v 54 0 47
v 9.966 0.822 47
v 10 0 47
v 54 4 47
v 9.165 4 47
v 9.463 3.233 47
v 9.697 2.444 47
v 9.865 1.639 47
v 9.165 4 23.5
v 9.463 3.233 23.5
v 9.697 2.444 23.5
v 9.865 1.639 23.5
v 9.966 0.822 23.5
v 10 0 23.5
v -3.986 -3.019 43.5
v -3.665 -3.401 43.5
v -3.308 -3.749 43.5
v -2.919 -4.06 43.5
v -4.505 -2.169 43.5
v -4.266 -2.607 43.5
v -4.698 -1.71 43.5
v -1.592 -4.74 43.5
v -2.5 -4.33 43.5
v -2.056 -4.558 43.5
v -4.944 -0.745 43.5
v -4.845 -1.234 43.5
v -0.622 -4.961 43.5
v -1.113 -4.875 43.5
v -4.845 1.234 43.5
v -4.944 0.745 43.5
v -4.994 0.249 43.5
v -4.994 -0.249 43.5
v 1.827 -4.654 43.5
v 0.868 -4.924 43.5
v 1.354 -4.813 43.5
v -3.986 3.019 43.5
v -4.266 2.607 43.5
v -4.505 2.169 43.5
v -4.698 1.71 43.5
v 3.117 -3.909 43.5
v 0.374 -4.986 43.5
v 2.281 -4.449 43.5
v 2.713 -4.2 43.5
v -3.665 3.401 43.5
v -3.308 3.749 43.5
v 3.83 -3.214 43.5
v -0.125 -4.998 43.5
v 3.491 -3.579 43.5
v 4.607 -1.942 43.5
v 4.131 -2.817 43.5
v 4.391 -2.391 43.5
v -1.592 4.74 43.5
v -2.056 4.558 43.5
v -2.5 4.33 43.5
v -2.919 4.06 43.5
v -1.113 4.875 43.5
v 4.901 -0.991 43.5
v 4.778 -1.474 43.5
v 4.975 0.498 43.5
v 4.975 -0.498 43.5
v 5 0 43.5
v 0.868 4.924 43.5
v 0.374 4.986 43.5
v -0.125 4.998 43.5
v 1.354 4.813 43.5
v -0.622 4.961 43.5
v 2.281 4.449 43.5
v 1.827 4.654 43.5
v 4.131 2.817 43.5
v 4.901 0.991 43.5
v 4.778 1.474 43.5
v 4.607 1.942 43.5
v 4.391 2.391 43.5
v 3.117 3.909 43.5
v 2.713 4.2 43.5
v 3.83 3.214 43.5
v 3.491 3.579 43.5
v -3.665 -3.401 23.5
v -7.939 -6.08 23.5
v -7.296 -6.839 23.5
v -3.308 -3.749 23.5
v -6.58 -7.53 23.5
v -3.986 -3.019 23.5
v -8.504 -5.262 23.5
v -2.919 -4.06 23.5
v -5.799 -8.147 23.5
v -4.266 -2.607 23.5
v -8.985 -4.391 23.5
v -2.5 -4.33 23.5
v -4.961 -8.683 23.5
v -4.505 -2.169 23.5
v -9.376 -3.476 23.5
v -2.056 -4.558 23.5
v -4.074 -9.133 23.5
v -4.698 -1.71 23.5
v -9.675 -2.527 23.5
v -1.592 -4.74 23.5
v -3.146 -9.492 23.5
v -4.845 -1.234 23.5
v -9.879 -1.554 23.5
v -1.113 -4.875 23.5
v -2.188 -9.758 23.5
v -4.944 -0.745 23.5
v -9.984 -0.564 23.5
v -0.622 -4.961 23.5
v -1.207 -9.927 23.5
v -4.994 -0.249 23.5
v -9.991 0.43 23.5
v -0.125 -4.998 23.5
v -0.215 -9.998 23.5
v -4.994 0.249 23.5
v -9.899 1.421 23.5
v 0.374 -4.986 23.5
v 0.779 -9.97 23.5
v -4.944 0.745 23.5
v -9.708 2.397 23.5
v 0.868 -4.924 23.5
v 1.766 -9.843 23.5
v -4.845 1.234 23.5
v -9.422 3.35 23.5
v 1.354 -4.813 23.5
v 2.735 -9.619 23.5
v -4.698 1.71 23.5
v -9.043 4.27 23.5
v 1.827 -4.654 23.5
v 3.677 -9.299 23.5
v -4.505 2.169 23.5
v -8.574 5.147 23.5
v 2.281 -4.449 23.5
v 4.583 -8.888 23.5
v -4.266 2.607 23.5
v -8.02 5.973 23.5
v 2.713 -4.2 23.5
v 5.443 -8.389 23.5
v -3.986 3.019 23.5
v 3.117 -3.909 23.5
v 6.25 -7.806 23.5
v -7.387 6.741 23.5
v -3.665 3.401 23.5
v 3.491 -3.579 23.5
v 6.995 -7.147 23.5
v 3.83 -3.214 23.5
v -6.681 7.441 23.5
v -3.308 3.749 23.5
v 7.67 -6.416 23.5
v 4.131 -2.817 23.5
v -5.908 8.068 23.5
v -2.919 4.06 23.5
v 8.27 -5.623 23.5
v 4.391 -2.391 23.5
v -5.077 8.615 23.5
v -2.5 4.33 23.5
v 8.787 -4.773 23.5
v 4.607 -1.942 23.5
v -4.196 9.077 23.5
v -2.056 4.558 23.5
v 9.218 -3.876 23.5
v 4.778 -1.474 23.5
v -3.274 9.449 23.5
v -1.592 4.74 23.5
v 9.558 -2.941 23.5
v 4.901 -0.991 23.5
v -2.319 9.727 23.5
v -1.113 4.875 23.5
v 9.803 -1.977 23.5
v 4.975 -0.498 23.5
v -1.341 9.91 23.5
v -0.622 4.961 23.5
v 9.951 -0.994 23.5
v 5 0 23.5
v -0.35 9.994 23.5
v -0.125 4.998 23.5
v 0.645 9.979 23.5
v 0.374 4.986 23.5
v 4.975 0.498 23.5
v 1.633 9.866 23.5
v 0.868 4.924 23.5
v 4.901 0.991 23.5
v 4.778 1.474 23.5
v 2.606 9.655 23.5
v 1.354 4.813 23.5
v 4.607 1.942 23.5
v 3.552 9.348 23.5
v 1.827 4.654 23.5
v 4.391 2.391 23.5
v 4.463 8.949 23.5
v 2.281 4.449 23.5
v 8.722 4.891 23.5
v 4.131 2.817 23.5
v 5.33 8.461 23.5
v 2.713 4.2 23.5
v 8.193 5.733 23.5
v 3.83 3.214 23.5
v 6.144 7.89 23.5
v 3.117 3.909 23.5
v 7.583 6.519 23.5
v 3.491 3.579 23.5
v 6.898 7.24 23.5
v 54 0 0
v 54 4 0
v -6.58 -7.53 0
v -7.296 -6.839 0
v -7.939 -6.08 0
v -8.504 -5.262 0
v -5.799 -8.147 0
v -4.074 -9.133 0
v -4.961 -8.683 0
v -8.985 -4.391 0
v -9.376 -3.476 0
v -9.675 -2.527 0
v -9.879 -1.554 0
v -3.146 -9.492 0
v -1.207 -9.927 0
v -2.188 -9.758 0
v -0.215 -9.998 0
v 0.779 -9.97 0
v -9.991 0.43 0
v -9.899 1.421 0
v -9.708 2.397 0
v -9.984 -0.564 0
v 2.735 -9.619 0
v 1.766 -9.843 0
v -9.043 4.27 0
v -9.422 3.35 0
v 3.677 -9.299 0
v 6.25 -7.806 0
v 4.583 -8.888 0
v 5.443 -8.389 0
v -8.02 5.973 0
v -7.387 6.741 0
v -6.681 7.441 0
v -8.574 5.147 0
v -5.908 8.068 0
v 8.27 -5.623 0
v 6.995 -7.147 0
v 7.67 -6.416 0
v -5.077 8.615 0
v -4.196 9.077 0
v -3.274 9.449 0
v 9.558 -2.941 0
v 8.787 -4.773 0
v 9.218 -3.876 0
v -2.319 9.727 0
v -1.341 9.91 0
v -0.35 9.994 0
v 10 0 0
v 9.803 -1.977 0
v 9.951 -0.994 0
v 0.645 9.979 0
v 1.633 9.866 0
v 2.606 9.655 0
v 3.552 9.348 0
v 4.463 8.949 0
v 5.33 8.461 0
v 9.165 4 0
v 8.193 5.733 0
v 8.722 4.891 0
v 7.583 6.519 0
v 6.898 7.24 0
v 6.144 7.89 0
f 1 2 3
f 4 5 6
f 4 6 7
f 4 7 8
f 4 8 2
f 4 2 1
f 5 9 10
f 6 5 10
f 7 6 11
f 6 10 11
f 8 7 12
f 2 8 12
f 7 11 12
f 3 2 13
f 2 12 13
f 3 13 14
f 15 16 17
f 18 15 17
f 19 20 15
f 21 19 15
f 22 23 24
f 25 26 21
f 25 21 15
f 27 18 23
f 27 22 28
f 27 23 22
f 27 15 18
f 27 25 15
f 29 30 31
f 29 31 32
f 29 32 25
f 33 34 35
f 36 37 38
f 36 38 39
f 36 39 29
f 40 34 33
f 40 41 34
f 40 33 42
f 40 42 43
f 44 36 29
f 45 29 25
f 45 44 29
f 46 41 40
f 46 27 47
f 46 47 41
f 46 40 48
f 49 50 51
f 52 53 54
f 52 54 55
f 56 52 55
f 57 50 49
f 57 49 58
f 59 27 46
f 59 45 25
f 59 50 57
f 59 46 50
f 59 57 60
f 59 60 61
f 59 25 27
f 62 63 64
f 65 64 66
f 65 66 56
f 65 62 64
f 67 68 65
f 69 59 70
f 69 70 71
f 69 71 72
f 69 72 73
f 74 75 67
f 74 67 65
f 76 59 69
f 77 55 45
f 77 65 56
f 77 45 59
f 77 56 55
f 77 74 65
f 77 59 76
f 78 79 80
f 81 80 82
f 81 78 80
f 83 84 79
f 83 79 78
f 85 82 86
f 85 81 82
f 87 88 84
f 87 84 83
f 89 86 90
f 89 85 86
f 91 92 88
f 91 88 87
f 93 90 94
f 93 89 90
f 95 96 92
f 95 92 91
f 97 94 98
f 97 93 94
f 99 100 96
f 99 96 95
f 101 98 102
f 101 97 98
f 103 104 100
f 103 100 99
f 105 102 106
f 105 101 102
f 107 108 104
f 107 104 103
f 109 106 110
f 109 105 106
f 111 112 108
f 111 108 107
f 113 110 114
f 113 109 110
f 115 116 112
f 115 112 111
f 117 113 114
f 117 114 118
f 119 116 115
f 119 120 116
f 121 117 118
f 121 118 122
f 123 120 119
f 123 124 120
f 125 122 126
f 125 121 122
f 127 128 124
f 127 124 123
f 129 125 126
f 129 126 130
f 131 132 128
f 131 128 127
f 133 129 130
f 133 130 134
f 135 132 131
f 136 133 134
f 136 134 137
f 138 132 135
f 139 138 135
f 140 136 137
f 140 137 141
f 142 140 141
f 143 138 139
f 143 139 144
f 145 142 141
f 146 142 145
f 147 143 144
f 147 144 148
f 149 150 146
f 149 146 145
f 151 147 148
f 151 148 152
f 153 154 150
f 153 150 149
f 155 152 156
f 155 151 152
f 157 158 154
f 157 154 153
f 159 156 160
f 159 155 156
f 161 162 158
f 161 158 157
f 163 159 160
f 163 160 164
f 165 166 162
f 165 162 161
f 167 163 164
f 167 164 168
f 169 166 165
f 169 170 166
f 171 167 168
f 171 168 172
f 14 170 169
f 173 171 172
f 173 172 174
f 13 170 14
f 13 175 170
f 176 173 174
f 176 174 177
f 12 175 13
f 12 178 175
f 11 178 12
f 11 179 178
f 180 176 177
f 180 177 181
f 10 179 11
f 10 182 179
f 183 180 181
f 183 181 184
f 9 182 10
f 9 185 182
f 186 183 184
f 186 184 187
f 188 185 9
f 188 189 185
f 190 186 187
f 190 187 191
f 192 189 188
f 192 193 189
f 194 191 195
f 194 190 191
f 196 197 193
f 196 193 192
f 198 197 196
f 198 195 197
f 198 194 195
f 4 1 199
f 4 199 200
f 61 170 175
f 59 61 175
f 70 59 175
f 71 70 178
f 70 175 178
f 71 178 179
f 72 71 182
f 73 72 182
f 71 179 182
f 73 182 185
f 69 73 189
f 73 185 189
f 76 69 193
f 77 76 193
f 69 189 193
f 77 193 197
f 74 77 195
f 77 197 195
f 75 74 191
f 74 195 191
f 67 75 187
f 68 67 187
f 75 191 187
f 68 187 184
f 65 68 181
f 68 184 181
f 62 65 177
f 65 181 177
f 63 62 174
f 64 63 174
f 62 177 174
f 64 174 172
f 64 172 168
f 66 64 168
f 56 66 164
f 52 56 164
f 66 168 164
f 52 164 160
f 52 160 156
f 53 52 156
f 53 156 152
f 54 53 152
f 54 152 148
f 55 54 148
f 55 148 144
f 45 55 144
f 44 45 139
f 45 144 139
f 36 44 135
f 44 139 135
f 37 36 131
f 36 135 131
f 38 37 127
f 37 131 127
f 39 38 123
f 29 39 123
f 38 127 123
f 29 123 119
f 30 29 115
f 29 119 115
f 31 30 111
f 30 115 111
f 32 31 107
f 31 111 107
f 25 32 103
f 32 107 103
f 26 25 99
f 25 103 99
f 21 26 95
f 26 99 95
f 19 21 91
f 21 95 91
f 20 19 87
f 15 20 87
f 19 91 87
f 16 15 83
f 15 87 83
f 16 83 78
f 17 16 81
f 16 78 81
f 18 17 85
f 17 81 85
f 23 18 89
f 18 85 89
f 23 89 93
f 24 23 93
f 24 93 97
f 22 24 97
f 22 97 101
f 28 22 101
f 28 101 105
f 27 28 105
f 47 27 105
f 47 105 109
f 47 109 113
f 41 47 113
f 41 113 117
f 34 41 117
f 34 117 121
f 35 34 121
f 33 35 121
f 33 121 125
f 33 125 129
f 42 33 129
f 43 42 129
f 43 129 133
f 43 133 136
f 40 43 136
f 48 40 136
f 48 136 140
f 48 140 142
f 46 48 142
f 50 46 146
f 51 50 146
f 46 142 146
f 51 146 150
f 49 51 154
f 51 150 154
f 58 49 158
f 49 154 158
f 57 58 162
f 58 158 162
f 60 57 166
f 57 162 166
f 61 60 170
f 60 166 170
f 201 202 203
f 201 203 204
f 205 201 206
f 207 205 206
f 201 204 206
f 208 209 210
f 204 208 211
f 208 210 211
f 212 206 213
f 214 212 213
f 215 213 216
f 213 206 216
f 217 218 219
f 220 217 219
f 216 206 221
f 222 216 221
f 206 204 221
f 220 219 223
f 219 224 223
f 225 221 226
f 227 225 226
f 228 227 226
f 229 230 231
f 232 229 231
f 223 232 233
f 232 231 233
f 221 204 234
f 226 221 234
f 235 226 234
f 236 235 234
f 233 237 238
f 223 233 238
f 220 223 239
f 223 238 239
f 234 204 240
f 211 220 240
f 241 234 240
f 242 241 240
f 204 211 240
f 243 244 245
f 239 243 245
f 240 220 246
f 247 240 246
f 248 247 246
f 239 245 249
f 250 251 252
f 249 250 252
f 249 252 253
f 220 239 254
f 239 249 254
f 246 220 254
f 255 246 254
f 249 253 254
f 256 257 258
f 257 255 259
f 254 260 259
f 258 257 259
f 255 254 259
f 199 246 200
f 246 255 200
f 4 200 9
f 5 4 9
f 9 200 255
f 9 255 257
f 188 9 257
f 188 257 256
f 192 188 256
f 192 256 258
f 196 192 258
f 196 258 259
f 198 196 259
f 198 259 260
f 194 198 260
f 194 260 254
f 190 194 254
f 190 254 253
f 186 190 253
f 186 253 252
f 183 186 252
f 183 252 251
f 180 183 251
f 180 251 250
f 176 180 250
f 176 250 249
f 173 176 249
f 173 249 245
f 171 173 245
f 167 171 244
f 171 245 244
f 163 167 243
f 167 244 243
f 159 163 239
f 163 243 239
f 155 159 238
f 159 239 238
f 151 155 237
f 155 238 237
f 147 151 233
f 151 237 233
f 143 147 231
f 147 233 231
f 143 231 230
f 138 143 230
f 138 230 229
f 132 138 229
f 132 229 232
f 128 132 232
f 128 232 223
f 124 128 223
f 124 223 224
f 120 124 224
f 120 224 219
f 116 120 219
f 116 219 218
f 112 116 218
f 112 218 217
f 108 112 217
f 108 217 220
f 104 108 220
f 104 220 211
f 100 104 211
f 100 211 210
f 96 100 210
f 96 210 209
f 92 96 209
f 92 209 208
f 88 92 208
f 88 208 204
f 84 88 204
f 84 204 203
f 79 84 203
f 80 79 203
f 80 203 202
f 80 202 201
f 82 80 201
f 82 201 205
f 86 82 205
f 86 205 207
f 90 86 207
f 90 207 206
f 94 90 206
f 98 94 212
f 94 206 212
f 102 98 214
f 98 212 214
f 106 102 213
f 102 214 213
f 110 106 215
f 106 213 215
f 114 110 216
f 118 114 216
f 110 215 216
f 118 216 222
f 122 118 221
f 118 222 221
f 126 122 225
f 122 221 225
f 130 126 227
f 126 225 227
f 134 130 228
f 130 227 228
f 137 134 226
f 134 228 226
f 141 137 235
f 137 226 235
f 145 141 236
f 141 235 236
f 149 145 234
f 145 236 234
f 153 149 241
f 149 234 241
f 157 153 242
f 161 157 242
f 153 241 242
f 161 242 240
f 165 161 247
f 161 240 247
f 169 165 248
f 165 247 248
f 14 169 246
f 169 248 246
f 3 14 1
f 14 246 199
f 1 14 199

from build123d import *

# Parameters (mm, degrees)
SKETCH1_R           = 10
BOSS_EXTRUDE1_DEPTH = 23.5
BOSS_EXTRUDE2_START = 23.5
SKETCH1_3_R         = 5
BOSS_EXTRUDE2_DEPTH = 20
BOSS_EXTRUDE3_DEPTH = 47


with BuildPart() as part:
    # Sketch1 → Boss-Extrude1 (new body)
    with BuildSketch(Plane.XY):
        Circle(SKETCH1_R)
    extrude(amount=BOSS_EXTRUDE1_DEPTH)

    # Sketch1<3> → Boss-Extrude2 (add)
    with BuildSketch(Plane.XY.offset(BOSS_EXTRUDE2_START)):
        Circle(SKETCH1_3_R)
    extrude(amount=BOSS_EXTRUDE2_DEPTH)

    # Sketch1<4> → Boss-Extrude3 (add)
    with BuildSketch(Plane.XY):
        with BuildLine():
            ThreePointArc((9.16515139, 4), (9.789063129, 2.043096437), (10, 0))
            Line((10, 0), (37.504998297, 0))
            Line((37.504998297, 0), (54, 0))
            Line((54, 0), (54, 4))
            Line((54, 4), (9.16515139, 4))
        make_face()
    extrude(amount=BOSS_EXTRUDE3_DEPTH)


solid = part.part
